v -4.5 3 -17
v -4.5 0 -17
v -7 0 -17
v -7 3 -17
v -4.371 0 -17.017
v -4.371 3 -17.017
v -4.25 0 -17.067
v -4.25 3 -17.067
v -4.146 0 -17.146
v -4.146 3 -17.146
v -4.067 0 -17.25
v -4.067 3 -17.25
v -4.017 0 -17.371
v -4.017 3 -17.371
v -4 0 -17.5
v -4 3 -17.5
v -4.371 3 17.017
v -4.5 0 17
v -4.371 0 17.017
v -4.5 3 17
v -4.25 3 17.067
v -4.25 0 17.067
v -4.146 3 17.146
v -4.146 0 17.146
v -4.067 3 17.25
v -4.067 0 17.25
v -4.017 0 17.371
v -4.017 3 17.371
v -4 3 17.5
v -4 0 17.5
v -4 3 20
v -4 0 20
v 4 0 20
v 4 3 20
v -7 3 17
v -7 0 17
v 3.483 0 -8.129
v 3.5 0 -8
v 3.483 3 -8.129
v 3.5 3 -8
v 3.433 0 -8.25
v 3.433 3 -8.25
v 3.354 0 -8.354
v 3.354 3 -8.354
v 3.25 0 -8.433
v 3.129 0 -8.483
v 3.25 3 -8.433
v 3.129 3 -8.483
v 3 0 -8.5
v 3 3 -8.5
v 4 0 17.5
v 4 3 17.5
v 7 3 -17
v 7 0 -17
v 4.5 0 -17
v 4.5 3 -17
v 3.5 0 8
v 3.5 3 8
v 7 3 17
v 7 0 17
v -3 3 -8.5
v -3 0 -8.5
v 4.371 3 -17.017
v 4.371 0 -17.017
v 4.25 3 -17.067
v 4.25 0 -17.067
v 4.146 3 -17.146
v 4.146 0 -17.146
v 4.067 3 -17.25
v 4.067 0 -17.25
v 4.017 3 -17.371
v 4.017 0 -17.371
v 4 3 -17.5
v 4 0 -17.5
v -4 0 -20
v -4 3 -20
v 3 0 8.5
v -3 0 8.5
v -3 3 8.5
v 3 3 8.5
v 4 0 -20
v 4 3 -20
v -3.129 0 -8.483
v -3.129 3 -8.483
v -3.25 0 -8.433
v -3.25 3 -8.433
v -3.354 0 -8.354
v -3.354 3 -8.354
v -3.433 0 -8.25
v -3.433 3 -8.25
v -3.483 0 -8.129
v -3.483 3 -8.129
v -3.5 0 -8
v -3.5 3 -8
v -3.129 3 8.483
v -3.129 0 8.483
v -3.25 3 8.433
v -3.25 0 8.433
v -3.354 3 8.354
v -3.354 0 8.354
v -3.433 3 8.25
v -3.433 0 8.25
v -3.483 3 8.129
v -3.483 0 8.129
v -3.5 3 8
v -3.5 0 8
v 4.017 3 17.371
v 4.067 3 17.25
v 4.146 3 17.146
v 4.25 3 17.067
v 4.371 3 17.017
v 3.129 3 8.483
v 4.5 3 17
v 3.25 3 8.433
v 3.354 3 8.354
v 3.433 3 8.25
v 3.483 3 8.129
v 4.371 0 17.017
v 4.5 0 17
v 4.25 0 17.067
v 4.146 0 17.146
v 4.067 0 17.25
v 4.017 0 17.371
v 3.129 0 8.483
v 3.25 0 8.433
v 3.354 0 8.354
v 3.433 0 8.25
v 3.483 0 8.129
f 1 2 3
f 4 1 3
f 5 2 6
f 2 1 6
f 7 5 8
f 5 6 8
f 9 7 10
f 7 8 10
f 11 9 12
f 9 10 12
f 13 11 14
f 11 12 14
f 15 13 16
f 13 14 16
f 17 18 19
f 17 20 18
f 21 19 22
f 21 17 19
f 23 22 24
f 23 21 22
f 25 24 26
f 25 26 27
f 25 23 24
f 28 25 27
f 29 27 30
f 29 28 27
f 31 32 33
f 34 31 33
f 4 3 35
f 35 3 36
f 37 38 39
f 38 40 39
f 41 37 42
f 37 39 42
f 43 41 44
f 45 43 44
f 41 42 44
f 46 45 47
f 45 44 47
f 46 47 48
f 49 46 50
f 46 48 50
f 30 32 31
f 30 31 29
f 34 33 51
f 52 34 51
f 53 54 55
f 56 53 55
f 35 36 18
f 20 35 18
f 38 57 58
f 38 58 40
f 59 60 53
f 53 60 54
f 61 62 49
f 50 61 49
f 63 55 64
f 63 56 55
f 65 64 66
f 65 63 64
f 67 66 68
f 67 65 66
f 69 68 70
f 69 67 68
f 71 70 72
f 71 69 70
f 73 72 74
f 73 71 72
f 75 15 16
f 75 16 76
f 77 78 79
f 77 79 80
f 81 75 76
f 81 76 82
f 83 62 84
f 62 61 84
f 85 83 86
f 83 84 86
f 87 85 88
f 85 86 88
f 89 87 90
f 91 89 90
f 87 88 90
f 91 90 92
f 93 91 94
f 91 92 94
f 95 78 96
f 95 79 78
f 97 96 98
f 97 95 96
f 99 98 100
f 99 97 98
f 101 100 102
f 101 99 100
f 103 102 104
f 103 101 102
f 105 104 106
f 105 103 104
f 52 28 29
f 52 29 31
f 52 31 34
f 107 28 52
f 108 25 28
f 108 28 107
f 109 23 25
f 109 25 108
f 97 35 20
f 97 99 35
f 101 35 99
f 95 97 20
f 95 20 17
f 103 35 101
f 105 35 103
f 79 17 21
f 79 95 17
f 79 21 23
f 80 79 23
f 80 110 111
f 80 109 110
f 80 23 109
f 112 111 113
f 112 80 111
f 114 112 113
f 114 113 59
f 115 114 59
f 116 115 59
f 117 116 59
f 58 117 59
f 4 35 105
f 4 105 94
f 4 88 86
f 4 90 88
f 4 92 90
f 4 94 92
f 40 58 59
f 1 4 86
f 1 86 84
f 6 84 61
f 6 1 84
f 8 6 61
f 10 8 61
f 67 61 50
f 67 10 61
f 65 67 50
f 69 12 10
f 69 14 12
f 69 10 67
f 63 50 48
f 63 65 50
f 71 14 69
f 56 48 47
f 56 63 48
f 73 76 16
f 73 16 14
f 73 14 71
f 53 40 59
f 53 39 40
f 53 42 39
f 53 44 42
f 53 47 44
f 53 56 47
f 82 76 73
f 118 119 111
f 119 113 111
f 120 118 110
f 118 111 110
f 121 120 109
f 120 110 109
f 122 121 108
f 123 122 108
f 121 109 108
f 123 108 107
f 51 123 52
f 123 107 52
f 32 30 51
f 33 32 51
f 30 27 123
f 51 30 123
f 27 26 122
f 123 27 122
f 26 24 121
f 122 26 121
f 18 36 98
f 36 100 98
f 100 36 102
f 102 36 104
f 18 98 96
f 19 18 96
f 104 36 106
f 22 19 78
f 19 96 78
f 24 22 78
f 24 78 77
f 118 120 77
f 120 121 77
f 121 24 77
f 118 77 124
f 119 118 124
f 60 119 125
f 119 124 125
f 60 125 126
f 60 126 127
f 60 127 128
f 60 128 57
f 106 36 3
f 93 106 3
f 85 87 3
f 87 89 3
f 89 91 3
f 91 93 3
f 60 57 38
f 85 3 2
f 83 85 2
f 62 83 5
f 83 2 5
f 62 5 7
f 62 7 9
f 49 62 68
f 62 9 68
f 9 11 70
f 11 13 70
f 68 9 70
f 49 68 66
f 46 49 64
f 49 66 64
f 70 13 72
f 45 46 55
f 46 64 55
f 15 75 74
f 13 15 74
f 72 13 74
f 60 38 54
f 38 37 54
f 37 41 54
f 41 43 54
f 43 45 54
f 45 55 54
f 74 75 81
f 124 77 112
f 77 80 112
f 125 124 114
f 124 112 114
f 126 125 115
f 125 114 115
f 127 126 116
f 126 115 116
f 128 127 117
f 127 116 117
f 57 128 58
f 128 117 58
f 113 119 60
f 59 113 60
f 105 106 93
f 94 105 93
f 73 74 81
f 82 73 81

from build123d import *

# Parameters (mm, degrees)
SKETCH_1_W      = 7
SKETCH_1_H      = 17
SKETCH_1_W_2    = 8
SKETCH_1_H_2    = 3
EXTRUDE_1_DEPTH = 3
FILLET_1_R      = 0.5


with BuildPart() as part:
    # 草图1 → 凸台-拉伸1 (new body)
    # profile 1 of 5: a face of its own
    with BuildSketch(Plane(origin=(0, 0, 0), x_dir=(1, 0, 0), z_dir=(0, 1, 0))):
        Polygon((-4, 17), (-7, 17), (-7, -17), (-4, -17), (-4, -14), (4, -14), (4, -17), (7, -17), (7, 17), (4, 17), (4, 14), (-4, 14), align=None)
        Rectangle(SKETCH_1_W, SKETCH_1_H, mode=Mode.SUBTRACT)
    # profile 2 of 5: a face of its own
    with BuildSketch(Plane(origin=(0, 0, 0), x_dir=(1, 0, 0), z_dir=(0, 1, 0))):
        with Locations((0, 18.5)):
            Rectangle(SKETCH_1_W_2, SKETCH_1_H_2)
    # profile 3 of 5: a face of its own
    with BuildSketch(Plane(origin=(0, 0, 0), x_dir=(1, 0, 0), z_dir=(0, 1, 0))):
        with Locations((0, 15.5)):
            Rectangle(SKETCH_1_W_2, SKETCH_1_H_2)
    # profile 4 of 5: a face of its own
    with BuildSketch(Plane(origin=(0, 0, 0), x_dir=(1, 0, 0), z_dir=(0, 1, 0))):
        with Locations((0, -18.5)):
            Rectangle(SKETCH_1_W_2, SKETCH_1_H_2)
    # profile 5 of 5: a face of its own
    with BuildSketch(Plane(origin=(0, 0, 0), x_dir=(1, 0, 0), z_dir=(0, 1, 0))):
        with Locations((0, -15.5)):
            Rectangle(SKETCH_1_W_2, SKETCH_1_H_2)
    extrude(amount=EXTRUDE_1_DEPTH)

    # 圆角1
    fillet_1_edges = [part.edges().sort_by_distance(p)[0] for p in [
        (-3.5, 1.5, -8.5),
        (-3.5, 1.5, 8.5),
        (3.5, 1.5, 8.5),
        (3.5, 1.5, -8.5),
        (-4, 1.5, -17),
        (4, 1.5, -17),
        (4, 1.5, 17),
        (-4, 1.5, 17),
    ]]
    fillet(fillet_1_edges, radius=FILLET_1_R)


solid = part.part
